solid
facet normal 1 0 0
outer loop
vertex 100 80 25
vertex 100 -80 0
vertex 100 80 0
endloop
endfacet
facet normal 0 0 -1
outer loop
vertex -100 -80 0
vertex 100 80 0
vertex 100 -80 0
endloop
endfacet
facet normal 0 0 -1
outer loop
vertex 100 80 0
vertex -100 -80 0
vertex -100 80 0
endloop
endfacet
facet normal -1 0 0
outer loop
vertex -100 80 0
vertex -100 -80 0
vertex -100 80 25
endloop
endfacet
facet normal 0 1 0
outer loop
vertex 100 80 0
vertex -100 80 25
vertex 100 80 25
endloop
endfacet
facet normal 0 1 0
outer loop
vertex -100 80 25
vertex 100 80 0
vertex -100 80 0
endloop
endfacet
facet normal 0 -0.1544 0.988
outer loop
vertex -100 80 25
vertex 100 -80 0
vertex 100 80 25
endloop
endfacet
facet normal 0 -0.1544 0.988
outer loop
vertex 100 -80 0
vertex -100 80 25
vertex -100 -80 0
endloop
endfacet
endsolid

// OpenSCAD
x=200;
y=160;
z=25;

translate([-x/2,-y/2,0])
difference(){
    cube([x,y,z]);
    rotate([atan(z/y),0,0])
    translate([-x/2,0,0])
    cube([x*2,y*2,z*2]);
}

circle(d=280);
